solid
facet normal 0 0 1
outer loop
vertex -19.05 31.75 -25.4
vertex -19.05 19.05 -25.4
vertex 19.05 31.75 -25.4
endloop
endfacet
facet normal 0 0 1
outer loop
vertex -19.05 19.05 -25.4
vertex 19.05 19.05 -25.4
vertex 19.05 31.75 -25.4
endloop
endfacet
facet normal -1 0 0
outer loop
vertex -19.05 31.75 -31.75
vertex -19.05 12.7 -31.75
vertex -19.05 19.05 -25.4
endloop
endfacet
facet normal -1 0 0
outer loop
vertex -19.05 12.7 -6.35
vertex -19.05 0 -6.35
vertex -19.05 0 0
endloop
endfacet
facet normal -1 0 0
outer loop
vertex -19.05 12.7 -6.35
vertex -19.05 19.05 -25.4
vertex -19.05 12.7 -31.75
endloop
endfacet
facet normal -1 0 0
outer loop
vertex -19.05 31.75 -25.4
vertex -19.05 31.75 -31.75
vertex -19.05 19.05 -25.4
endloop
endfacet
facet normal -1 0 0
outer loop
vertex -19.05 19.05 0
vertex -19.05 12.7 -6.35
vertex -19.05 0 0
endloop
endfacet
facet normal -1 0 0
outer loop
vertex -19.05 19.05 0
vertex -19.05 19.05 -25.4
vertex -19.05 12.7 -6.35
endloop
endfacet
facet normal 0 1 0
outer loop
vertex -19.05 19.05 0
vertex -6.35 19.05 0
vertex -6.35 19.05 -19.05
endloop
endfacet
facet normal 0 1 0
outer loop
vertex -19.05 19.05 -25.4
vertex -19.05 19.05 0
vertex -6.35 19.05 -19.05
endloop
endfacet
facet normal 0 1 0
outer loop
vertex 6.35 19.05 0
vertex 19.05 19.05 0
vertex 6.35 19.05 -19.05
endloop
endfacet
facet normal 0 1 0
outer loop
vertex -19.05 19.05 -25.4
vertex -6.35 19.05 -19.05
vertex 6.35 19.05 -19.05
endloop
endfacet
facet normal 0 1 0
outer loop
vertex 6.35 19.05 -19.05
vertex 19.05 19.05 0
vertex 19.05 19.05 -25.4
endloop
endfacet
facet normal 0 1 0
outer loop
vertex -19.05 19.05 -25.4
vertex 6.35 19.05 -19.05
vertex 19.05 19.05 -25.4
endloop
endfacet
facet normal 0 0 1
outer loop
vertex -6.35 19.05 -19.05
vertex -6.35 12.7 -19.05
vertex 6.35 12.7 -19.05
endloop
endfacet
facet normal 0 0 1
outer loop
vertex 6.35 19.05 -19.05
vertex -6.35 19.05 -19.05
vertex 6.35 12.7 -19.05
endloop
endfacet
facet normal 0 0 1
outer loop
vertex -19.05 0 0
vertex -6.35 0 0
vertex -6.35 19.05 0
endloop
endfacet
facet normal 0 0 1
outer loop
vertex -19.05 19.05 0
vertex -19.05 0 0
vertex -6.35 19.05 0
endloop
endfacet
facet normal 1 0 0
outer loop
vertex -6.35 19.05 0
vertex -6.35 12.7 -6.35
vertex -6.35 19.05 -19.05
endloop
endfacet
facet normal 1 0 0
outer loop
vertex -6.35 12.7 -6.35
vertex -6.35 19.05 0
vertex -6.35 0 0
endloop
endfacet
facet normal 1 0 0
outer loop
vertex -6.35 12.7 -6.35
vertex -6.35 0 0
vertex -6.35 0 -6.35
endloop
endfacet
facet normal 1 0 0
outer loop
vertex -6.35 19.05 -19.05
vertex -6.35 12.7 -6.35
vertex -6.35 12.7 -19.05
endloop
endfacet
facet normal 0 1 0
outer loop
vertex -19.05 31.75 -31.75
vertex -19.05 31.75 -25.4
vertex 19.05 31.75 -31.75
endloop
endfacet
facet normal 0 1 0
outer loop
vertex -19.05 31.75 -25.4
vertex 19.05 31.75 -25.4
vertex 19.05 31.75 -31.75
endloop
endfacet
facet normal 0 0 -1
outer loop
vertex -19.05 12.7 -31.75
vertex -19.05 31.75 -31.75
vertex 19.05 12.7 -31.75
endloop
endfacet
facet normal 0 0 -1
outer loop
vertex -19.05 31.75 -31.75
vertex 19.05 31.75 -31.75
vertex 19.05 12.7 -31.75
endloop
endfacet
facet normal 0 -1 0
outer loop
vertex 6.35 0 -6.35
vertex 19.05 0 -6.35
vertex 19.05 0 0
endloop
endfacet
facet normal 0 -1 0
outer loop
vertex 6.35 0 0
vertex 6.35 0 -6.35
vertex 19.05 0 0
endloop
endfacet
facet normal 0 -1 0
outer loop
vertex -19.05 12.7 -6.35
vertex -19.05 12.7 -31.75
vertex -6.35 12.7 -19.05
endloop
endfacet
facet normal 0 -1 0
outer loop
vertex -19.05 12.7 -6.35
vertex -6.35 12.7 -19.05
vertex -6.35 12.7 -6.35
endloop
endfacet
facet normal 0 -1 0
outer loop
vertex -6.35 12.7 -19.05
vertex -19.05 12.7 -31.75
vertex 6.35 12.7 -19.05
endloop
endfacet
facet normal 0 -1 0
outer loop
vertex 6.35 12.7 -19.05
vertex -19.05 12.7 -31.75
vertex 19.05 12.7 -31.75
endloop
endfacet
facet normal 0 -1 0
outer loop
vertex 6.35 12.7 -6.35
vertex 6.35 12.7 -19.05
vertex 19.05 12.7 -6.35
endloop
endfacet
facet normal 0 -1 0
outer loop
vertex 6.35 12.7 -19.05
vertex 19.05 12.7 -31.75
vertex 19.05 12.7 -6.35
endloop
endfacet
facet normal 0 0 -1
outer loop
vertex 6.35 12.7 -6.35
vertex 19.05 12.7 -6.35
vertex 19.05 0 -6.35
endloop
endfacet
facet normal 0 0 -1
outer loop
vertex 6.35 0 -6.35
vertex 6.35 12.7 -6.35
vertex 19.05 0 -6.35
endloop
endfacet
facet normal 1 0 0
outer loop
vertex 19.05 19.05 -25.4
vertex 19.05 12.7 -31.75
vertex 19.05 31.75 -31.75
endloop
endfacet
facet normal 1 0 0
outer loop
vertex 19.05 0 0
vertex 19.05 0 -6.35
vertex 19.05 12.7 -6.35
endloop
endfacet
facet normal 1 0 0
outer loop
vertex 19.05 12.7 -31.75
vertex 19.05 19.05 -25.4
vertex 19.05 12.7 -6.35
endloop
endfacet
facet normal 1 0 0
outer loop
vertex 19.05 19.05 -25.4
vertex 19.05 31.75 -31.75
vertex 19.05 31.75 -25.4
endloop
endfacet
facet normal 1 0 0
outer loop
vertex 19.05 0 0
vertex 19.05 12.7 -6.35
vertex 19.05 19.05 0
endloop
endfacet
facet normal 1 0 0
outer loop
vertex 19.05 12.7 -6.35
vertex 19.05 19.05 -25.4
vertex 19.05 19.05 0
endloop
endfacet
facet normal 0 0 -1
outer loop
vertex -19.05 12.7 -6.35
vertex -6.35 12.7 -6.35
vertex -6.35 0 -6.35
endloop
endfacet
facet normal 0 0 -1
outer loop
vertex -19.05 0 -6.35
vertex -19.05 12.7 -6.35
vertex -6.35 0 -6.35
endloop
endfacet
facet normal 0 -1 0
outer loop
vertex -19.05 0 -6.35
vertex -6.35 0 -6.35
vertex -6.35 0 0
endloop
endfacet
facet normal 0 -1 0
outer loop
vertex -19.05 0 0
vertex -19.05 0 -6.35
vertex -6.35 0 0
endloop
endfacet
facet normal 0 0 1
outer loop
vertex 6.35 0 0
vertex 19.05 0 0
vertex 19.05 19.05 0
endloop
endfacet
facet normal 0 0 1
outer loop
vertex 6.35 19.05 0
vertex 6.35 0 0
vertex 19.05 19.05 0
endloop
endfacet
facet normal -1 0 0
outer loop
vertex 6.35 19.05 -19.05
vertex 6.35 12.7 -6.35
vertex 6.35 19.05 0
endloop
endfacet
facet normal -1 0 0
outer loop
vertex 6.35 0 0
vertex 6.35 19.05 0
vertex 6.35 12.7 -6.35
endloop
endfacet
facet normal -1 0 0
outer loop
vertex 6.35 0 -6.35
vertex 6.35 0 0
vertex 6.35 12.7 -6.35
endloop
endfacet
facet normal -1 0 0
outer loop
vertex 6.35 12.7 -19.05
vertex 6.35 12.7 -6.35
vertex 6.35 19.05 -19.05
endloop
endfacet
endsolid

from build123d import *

# Parameters (mm, degrees)
BOSS_EXTRUDE1_DEPTH     = 19.05
CUT_EXTRUDE1_DEPTH      = 38.1
CUT_EXTRUDE1_DEPTH_BACK = 42.639734629
SKETCH2_W               = 12.7
SKETCH2_H               = 19.05


with BuildPart() as part:
    # Sketch1 → Boss-Extrude1 (new, symmetric)
    with BuildSketch(Plane(origin=(0, 0, 0), x_dir=(0, 0, -1), z_dir=(1, 0, 0))):
        Polygon((0, 0), (0, 19.05), (25.4, 19.05), (25.4, 31.75), (31.75, 31.75), (31.75, 12.7), (6.35, 12.7), (6.35, 0), align=None)
    extrude(amount=BOSS_EXTRUDE1_DEPTH, both=True)

    # Sketch2 → Cut-Extrude1 (cut, two sides: drawn at the far end of the back side and taken through both)
    with BuildSketch(Plane(origin=(0, 19.05, 0), x_dir=(1, 0, 0), z_dir=(0, 1, 0)).offset(-CUT_EXTRUDE1_DEPTH_BACK)):
        with Locations((0, 9.525)):
            Rectangle(SKETCH2_W, SKETCH2_H)
    extrude(amount=CUT_EXTRUDE1_DEPTH + CUT_EXTRUDE1_DEPTH_BACK, mode=Mode.SUBTRACT)


solid = part.part
